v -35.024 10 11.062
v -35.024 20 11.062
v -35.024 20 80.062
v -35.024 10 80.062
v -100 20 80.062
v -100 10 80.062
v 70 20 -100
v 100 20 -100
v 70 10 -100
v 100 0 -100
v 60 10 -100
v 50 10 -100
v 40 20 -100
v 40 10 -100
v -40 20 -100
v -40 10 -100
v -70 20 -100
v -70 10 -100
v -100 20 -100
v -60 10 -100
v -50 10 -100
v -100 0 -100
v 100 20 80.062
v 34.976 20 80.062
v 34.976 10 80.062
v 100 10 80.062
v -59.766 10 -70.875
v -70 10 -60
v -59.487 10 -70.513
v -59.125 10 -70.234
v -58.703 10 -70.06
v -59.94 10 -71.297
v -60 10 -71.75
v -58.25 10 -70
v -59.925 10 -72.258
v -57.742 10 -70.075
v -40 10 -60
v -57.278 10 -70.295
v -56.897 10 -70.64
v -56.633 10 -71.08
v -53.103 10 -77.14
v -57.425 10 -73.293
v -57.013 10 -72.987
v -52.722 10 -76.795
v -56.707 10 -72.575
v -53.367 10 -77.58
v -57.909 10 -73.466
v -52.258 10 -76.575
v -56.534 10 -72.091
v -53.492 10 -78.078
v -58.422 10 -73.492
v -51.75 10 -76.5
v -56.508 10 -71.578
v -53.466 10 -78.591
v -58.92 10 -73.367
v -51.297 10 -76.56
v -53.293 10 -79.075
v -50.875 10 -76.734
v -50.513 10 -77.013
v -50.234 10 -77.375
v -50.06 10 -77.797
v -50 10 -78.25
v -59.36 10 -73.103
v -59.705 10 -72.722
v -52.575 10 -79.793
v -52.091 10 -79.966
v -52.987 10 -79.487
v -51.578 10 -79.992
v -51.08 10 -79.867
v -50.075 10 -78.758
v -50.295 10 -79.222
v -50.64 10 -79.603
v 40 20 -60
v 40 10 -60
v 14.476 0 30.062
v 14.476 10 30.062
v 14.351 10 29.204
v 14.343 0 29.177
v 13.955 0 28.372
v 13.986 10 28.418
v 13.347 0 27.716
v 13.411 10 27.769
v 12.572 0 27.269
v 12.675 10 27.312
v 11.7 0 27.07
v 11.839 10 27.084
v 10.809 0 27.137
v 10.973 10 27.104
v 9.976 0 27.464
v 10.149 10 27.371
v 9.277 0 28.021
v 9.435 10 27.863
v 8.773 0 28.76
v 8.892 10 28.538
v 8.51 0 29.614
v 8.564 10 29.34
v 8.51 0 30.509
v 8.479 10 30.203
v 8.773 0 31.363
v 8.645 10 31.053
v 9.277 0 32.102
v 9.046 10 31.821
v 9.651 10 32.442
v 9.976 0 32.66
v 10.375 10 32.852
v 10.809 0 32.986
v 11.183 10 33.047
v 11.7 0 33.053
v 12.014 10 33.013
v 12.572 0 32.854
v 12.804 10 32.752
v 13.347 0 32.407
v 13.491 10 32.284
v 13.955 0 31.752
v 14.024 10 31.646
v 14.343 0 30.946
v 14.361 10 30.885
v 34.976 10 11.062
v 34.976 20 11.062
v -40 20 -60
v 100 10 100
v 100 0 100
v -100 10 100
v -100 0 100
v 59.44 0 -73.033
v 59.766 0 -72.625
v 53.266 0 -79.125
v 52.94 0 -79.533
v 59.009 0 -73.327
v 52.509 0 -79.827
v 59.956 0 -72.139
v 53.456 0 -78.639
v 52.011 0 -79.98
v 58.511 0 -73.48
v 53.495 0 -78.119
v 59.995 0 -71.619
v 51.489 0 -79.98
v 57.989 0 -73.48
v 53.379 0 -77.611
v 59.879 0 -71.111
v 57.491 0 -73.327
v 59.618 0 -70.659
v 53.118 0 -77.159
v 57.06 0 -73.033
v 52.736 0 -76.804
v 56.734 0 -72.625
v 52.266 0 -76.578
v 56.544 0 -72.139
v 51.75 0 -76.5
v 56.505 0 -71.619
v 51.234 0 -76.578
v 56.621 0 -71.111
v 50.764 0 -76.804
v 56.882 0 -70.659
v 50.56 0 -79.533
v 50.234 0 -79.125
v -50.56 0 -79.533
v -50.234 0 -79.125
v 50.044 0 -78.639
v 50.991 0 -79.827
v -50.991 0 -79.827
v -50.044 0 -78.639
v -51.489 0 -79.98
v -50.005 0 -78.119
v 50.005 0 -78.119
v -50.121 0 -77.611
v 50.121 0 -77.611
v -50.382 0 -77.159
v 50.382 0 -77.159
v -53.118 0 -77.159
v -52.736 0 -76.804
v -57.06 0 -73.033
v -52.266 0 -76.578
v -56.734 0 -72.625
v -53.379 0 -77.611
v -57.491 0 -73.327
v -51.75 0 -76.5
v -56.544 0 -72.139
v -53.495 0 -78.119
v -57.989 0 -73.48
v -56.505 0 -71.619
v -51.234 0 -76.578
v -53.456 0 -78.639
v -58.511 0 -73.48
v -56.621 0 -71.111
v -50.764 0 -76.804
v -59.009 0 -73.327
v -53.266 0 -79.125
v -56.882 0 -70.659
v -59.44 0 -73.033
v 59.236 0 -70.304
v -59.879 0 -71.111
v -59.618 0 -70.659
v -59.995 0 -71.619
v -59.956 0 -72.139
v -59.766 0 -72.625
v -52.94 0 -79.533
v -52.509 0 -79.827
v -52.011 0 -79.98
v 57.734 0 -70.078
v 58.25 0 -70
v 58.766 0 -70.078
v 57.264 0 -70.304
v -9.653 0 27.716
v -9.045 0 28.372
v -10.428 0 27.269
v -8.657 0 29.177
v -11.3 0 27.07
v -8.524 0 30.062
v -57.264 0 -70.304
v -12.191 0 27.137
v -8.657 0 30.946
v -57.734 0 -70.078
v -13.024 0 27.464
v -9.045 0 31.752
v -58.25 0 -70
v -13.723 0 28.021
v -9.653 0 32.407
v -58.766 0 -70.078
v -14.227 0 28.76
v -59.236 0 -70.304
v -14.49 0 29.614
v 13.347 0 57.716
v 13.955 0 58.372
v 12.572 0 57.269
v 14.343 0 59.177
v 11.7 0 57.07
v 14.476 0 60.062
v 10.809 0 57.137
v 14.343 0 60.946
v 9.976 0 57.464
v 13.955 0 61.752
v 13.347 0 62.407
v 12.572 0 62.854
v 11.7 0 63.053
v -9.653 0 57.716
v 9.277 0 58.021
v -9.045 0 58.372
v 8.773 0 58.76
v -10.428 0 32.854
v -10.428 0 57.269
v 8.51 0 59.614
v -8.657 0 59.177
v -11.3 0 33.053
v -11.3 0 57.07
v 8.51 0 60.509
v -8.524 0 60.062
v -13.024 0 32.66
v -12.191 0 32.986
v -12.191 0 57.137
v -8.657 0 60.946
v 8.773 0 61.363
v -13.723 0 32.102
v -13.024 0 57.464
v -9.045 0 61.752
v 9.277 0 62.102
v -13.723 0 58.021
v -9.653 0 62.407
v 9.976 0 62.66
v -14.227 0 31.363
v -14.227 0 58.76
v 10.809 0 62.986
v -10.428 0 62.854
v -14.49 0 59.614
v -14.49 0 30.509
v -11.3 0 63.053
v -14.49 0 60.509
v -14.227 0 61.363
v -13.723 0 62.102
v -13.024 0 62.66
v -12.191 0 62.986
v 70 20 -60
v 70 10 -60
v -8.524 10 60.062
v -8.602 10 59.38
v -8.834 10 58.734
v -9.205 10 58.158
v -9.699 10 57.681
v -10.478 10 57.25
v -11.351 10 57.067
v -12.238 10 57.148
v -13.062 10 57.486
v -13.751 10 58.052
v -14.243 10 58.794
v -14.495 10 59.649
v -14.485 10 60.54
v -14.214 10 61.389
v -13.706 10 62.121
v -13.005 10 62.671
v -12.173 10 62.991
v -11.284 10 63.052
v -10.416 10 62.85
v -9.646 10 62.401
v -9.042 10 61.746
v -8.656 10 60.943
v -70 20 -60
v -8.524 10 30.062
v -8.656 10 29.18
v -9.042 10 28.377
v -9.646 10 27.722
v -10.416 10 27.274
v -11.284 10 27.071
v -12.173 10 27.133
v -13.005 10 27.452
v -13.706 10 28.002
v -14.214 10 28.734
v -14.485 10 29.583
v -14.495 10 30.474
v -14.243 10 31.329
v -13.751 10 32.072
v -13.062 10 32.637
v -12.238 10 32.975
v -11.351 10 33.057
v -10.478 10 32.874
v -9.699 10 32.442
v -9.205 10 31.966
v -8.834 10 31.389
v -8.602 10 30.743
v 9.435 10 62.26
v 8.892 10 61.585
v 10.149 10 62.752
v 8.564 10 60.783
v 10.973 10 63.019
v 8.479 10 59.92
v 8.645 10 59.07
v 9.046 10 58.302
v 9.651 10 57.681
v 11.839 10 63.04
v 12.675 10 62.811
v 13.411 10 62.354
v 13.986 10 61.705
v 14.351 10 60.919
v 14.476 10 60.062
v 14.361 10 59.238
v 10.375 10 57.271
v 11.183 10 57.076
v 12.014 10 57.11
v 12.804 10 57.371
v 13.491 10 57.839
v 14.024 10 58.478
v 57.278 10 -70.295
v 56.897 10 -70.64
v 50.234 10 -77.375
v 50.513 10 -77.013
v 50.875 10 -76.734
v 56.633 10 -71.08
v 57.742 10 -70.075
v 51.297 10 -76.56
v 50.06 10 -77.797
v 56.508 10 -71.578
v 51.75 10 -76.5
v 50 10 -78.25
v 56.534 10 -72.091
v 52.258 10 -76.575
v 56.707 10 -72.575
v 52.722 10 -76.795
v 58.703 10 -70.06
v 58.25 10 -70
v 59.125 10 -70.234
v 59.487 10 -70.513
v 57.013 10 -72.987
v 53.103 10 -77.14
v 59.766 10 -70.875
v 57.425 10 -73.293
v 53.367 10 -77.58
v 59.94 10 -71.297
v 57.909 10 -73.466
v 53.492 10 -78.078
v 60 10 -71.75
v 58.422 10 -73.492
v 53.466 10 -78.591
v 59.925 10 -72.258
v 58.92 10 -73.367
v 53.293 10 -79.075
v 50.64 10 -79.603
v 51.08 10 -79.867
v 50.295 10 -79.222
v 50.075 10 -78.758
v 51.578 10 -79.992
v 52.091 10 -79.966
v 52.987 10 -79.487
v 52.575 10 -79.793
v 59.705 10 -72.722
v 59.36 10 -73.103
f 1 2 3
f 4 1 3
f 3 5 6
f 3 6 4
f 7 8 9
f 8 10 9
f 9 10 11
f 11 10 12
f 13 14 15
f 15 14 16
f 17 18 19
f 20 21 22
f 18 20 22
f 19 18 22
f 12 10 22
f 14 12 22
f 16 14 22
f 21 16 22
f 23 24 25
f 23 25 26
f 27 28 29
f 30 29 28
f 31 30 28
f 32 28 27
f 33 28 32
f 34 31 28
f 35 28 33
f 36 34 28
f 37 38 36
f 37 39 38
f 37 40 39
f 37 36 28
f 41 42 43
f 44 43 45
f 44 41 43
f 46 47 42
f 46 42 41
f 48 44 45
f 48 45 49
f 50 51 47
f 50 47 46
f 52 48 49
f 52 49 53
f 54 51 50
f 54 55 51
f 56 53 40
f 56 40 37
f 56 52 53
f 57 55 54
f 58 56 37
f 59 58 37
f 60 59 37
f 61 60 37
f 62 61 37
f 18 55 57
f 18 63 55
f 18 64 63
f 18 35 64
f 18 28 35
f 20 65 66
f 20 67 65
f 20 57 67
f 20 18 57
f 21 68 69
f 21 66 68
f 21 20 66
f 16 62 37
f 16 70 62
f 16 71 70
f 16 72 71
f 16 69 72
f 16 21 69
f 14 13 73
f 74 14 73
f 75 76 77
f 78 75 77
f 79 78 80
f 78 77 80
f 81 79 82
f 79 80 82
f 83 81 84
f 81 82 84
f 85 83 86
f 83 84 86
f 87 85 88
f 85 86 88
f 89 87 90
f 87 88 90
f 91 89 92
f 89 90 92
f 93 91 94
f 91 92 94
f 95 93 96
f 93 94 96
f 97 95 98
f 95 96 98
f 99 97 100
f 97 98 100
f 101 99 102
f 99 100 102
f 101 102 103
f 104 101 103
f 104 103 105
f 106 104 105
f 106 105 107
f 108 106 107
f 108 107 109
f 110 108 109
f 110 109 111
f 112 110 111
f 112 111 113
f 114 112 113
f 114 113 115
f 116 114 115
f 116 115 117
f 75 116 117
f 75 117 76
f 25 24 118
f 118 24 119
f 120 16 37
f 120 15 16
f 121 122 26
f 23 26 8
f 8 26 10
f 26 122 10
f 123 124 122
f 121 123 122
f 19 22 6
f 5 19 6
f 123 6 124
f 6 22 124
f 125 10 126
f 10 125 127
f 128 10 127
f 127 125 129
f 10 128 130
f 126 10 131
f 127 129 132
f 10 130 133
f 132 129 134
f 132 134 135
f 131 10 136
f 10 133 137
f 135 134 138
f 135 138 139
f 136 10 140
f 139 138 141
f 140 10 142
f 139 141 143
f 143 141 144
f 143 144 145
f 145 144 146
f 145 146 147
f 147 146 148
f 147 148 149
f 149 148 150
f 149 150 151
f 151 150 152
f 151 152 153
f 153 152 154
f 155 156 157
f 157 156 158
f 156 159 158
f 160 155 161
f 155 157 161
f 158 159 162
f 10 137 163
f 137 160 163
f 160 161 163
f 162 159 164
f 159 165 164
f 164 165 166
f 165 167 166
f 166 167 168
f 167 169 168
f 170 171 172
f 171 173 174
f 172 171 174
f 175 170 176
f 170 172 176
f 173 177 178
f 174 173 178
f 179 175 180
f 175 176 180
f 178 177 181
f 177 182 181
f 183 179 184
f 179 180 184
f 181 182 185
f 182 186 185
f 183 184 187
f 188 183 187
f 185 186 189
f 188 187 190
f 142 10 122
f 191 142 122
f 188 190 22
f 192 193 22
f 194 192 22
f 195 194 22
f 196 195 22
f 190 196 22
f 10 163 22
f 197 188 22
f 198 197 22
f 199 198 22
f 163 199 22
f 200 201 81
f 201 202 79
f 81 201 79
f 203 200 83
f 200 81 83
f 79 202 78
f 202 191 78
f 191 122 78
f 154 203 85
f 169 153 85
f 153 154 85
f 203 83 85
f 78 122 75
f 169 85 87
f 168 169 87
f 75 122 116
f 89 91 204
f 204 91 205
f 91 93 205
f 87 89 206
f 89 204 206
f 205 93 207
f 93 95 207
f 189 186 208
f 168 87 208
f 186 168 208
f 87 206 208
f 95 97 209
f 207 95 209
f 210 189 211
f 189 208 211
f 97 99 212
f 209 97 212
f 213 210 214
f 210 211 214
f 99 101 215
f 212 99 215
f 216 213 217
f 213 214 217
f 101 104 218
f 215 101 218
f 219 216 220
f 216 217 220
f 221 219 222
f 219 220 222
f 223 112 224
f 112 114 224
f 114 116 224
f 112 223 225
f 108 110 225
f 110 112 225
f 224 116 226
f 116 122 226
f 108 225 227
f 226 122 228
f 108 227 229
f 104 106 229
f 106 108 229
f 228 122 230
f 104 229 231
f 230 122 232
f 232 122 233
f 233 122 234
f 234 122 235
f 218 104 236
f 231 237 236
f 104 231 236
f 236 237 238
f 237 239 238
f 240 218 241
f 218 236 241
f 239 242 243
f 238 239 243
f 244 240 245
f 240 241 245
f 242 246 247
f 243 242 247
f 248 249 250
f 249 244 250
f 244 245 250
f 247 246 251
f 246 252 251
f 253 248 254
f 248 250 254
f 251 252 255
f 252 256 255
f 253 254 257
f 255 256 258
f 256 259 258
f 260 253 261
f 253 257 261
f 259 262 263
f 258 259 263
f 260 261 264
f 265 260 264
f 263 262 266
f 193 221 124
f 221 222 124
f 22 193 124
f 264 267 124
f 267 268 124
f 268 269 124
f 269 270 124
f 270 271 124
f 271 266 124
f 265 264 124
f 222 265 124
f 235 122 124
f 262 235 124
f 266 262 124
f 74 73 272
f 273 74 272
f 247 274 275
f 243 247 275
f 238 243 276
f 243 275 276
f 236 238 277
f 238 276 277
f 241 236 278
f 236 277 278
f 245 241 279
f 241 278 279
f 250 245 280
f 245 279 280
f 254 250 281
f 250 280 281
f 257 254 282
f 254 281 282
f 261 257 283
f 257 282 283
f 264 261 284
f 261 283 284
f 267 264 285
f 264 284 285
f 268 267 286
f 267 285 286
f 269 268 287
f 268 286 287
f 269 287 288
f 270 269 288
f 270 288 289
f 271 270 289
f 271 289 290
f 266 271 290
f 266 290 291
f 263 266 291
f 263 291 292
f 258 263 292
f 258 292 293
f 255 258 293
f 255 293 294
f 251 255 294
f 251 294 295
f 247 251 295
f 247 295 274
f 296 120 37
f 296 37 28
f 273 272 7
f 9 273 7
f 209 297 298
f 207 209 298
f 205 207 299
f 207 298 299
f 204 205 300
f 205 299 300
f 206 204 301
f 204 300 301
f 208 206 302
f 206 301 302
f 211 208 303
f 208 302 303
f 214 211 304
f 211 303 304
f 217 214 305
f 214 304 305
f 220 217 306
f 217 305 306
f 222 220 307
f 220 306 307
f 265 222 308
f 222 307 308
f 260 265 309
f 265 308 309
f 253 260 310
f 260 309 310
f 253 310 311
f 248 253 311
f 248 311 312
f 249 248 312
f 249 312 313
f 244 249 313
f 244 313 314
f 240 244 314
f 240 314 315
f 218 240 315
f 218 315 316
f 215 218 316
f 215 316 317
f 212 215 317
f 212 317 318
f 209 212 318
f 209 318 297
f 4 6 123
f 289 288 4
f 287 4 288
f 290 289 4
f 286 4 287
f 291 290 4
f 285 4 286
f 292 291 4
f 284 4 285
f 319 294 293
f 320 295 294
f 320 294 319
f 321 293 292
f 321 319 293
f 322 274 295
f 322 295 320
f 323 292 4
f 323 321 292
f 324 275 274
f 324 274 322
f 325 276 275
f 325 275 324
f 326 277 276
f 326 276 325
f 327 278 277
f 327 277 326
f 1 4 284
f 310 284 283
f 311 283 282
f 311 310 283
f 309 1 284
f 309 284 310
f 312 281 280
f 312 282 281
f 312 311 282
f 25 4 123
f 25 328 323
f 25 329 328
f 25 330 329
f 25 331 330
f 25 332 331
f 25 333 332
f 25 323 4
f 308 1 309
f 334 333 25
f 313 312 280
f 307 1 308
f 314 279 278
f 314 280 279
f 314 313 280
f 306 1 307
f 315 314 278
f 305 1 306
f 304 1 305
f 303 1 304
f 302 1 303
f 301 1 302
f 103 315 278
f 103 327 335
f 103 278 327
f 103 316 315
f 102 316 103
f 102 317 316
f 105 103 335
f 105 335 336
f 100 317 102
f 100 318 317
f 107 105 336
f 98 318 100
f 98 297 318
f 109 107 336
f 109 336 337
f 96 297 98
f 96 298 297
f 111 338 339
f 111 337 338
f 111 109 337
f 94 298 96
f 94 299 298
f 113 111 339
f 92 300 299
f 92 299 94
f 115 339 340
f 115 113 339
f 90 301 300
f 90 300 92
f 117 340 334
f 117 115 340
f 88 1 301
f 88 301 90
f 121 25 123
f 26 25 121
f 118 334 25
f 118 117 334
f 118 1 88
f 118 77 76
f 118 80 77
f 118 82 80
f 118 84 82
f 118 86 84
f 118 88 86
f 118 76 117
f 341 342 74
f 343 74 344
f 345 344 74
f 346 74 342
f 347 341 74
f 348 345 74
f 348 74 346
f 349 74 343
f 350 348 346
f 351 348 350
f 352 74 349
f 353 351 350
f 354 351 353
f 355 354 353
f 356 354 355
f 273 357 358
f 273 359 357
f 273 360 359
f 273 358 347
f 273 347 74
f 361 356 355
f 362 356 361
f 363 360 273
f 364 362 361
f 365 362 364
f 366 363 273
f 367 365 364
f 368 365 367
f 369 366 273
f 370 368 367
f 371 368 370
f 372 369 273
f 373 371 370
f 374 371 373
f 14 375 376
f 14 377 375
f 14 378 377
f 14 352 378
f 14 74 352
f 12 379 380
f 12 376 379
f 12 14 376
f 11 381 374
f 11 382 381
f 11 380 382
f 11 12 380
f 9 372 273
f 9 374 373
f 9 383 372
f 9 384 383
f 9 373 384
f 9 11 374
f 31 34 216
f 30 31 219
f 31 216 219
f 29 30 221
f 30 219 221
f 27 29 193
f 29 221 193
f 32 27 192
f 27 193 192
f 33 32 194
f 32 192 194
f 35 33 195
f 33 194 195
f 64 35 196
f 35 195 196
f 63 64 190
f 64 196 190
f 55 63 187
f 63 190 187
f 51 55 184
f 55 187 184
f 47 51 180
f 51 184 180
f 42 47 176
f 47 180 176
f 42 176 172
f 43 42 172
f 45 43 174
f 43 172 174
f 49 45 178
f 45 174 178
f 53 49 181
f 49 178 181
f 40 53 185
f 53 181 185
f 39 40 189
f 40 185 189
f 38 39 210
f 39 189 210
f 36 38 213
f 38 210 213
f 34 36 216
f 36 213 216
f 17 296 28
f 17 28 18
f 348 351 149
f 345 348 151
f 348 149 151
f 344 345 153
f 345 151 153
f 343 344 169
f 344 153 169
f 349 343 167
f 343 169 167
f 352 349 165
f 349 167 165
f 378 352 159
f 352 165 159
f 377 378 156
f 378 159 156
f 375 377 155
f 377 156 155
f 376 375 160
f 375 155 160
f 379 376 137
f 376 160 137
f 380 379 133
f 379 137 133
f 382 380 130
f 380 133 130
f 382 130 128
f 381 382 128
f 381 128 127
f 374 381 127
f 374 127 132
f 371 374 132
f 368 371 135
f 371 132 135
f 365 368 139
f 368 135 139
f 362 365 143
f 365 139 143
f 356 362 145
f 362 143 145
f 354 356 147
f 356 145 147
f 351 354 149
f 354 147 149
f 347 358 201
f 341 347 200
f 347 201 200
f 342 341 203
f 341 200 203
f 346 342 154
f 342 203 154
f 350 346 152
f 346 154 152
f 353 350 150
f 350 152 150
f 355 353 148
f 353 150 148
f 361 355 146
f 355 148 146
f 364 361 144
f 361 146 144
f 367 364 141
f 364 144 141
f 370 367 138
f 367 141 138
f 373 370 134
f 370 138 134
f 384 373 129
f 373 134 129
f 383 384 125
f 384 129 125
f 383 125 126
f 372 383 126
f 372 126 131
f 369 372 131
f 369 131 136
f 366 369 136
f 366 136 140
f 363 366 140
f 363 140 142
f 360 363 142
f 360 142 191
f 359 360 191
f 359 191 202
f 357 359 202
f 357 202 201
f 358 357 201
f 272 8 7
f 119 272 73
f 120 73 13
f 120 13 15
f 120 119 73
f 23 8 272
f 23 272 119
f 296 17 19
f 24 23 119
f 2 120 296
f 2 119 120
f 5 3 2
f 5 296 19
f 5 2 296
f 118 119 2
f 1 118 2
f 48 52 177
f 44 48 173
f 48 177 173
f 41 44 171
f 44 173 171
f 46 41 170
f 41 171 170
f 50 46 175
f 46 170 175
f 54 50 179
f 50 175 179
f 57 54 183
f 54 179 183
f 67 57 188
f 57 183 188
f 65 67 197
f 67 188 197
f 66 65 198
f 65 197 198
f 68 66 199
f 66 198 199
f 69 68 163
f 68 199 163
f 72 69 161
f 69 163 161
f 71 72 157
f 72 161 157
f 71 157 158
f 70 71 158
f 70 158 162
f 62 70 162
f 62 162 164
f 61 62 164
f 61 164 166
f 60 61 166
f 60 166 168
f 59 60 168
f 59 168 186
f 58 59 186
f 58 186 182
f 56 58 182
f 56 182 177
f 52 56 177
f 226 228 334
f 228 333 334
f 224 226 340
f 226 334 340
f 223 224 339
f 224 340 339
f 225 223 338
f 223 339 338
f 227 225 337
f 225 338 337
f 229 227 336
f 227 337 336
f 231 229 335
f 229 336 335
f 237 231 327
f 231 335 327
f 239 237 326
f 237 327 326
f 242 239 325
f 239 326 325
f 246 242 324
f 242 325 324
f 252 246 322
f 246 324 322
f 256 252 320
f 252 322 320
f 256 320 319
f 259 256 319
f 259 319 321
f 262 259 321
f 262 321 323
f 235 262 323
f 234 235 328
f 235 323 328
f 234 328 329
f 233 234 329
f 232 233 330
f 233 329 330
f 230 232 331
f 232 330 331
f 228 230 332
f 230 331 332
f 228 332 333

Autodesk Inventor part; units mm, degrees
ref_plane "YZ Plane" through (0, 0, 0) normal (1, 0, 0) x (0, 1, 0)
ref_plane "XZ Plane" through (0, 0, 0) normal (0, 1, 0) x (-1, 0, 0)
ref_plane "XY Plane" through (0, 0, 0) normal (0, 0, 1) x (1, 0, 0)
sketch "Boceto1" plane through (0, 0, 0) normal (0, 1, 0) x (-1, 0, 0)
  line L0 (100, 100) -> (-100, 100)
  line L1 (-100, 100) -> (-100, -100)
  line L2 (-100, -100) -> (100, -100)
  line L3 (100, -100) -> (100, 100)
  line L4 (100, 100) -> (-100, -100) construction
  line L5 (-100, 100) -> (100, -100) construction
  point P0 (0, 0)
  dimension "d0" = 200
  dimension "d1" = 200
extrude "Extrusión1" add sketch "Boceto1" along normal blind 20
sketch "Boceto2" plane through (0, 20, 0) normal (0, 1, 0) x (1, 0, 0)
  circle A0 centre (-11.5239, -30.0616) radius 3
  circle A1 centre (11.4761, -30.0616) radius 3
  circle A2 centre (-11.5239, -60.0616) radius 3
  circle A3 centre (11.4761, -60.0616) radius 3
  line L0 (-0.0239, -45.0616) -> (-35.0239, -45.0616)
  line L1 (-35.0239, -45.0616) -> (-35.0239, -80.0616)
  line L2 (-0.0239, -45.0616) -> (34.9761, -45.0616)
  line L3 (-11.5239, -30.0616) -> (11.4761, -60.0616)
  line L4 (-11.5239, -60.0616) -> (11.4761, -30.0616)
  line L5 (34.9761, -11.0616) -> (-35.0239, -11.0616)
  line L6 (-35.0239, -11.0616) -> (-35.0239, -80.0616)
  line L7 (34.9761, -80.0616) -> (34.9761, -11.0616)
  line L8 (-105, -100.0616) -> (105, -100.0616)
  line L9 (-105.0239, -80.0616) -> (104.9761, -80.0616)
  line L10 (-35.0239, -80.0616) -> (34.9761, -80.0616)
  line L11 (105, -100.0616) -> (95.8154, -100.0616)
  line L12 (-105.0239, -80.0616) -> (104.9761, -80.0616)
  line L13 (105, -80.0616) -> (-105, -80.0616)
  line L14 (-105, -100.0616) -> (105, -100.0616)
  line L15 (105, -90.0616) -> (94.0798, -90.0616)
  line L16 (-105, -100.0616) -> (105, -100.0616)
  line L17 (-105, -80.0616) -> (105, -80.0616)
  line L18 (105, -80.0616) -> (105, -100.0616)
  line L19 (105, -100.0616) -> (-105, -100.0616)
  line L20 (-105, -100.0616) -> (-105, -80.0616)
  line L21 (-100, 100) -> (-100, -100) projected
  line L22 (-100, -100) -> (100.4077, -100)
  point P0 (0, 0)
  point P1 (0, -10.0616)
  point P2 (0, -90.0616)
  point P3 (-0.0478, -80.0616)
  dimension "d4" = 20
  dimension "d5" = 20
  dimension "d6" = 30
  dimension "d7" = 30
  dimension "d8" = 20
  dimension "d9" = 35
  dimension "d10" = 35
  dimension "d11" = 69
extrude "Extrusión2" cut sketch "Boceto2" against normal blind 10
sketch "Boceto3" plane through (0, 20, 0) normal (0, 1, 0) x (1, 0, 0)
  circle A0 centre (-11.5239, -30.0616) radius 3 projected
  circle A1 centre (-11.5239, -30.0616) radius 3
  circle A2 centre (11.4761, -30.0616) radius 3 projected
  circle A3 centre (11.4761, -30.0616) radius 3
  circle A4 centre (11.4761, -60.0616) radius 3 projected
  circle A5 centre (11.4761, -60.0616) radius 3
  circle A6 centre (-11.5239, -60.0616) radius 3
  point P0 (0, 0)
extrude "Extrusión3" cut sketch "Boceto3" against normal blind 20
sketch "Boceto4" plane through (0, 20, 0) normal (0, 1, 0) x (1, 0, 0)
  circle A0 centre (-51.75, 78.25) radius 1.75
  line L0 (-50, 70) -> (-60, 70)
  line L1 (-60, 70) -> (-60, 80)
  line L2 (-60, 80) -> (-50, 80)
  line L3 (-50, 80) -> (-50, 70)
  line L4 (-50, 70) -> (-60, 80) construction
  line L5 (-60, 70) -> (-50, 80) construction
  line L6 (-105, 90) -> (-105, -90)
  circle A1 centre (-58.25, 71.75) radius 1.75
  line L7 (0, 90) -> (0, 77.3124)
  circle A2 centre (51.75, 78.25) radius 1.75
  line L8 (50, 70) -> (60, 70)
  line L9 (60, 70) -> (60, 80)
  line L10 (60, 80) -> (50, 80)
  line L11 (50, 80) -> (50, 70)
  line L12 (50, 70) -> (60, 80) construction
  line L13 (60, 70) -> (50, 80) construction
  circle A3 centre (58.25, 71.75) radius 1.75
  line L14 (100, 100) -> (-100, 100) projected
  line L15 (-100, 100) -> (-100, -80.0616) projected
  line L16 (100, -80.0616) -> (100, 100) projected
  point P0 (0, 0)
  point P1 (0, 0)
  point P2 (-60, 75)
  point P3 (60, 75)
  dimension "d16" = 3.5
  dimension "d18" = 1.75
  dimension "d19" = 1.75
  dimension "d20" = 1.75
  dimension "d21" = 1.75
  dimension "d22" = 10
  dimension "d23" = 10
  dimension "d25" = 20
  dimension "d26" = 40
  dimension "d27" = 40
hole "Agujero1" at (-58.25, 20, -71.75) at (-51.75, 20, -78.25) at (58.25, 20, -71.75) at (51.75, 20, -78.25) direction (0, -1, 0) diameter 3.5 end through all
sketch "Boceto5" plane through (0, 20, 0) normal (0, 1, 0) x (1, 0, 0)
  line L0 (0, 90) -> (0, 68.25)
  circle A0 centre (-51.75, 78.25) radius 1.75 projected
  line L1 (-50, 78.25) -> (-50, 100)
  circle A1 centre (-58.25, 71.75) radius 1.75 projected
  line L2 (-60, 71.75) -> (-60, 100)
  line L3 (-60, 100) -> (-70, 100)
  line L4 (-50, 100) -> (-40, 100)
  line L5 (-40, 100) -> (-40, 60)
  line L6 (-40, 60) -> (-70, 60)
  line L7 (-70, 60) -> (-70, 100)
  line L8 (-70, 100) -> (-40, 100)
  circle A2 centre (51.75, 78.25) radius 1.75
  line L9 (50, 78.25) -> (50, 100)
  circle A3 centre (58.25, 71.75) radius 1.75
  line L10 (60, 71.75) -> (60, 100)
  line L11 (60, 100) -> (70, 100)
  line L12 (50, 100) -> (40, 100)
  line L13 (40, 100) -> (40, 60)
  line L14 (40, 60) -> (70, 60)
  line L15 (70, 60) -> (70, 100)
  line L16 (70, 100) -> (40, 100)
  point P0 (0, 0)
  dimension "d38" = 10
  dimension "d39" = 10
  dimension "d40" = 40
extrude "Extrusión4" cut sketch "Boceto5" against normal blind 10
properties part number "base_front_red"
